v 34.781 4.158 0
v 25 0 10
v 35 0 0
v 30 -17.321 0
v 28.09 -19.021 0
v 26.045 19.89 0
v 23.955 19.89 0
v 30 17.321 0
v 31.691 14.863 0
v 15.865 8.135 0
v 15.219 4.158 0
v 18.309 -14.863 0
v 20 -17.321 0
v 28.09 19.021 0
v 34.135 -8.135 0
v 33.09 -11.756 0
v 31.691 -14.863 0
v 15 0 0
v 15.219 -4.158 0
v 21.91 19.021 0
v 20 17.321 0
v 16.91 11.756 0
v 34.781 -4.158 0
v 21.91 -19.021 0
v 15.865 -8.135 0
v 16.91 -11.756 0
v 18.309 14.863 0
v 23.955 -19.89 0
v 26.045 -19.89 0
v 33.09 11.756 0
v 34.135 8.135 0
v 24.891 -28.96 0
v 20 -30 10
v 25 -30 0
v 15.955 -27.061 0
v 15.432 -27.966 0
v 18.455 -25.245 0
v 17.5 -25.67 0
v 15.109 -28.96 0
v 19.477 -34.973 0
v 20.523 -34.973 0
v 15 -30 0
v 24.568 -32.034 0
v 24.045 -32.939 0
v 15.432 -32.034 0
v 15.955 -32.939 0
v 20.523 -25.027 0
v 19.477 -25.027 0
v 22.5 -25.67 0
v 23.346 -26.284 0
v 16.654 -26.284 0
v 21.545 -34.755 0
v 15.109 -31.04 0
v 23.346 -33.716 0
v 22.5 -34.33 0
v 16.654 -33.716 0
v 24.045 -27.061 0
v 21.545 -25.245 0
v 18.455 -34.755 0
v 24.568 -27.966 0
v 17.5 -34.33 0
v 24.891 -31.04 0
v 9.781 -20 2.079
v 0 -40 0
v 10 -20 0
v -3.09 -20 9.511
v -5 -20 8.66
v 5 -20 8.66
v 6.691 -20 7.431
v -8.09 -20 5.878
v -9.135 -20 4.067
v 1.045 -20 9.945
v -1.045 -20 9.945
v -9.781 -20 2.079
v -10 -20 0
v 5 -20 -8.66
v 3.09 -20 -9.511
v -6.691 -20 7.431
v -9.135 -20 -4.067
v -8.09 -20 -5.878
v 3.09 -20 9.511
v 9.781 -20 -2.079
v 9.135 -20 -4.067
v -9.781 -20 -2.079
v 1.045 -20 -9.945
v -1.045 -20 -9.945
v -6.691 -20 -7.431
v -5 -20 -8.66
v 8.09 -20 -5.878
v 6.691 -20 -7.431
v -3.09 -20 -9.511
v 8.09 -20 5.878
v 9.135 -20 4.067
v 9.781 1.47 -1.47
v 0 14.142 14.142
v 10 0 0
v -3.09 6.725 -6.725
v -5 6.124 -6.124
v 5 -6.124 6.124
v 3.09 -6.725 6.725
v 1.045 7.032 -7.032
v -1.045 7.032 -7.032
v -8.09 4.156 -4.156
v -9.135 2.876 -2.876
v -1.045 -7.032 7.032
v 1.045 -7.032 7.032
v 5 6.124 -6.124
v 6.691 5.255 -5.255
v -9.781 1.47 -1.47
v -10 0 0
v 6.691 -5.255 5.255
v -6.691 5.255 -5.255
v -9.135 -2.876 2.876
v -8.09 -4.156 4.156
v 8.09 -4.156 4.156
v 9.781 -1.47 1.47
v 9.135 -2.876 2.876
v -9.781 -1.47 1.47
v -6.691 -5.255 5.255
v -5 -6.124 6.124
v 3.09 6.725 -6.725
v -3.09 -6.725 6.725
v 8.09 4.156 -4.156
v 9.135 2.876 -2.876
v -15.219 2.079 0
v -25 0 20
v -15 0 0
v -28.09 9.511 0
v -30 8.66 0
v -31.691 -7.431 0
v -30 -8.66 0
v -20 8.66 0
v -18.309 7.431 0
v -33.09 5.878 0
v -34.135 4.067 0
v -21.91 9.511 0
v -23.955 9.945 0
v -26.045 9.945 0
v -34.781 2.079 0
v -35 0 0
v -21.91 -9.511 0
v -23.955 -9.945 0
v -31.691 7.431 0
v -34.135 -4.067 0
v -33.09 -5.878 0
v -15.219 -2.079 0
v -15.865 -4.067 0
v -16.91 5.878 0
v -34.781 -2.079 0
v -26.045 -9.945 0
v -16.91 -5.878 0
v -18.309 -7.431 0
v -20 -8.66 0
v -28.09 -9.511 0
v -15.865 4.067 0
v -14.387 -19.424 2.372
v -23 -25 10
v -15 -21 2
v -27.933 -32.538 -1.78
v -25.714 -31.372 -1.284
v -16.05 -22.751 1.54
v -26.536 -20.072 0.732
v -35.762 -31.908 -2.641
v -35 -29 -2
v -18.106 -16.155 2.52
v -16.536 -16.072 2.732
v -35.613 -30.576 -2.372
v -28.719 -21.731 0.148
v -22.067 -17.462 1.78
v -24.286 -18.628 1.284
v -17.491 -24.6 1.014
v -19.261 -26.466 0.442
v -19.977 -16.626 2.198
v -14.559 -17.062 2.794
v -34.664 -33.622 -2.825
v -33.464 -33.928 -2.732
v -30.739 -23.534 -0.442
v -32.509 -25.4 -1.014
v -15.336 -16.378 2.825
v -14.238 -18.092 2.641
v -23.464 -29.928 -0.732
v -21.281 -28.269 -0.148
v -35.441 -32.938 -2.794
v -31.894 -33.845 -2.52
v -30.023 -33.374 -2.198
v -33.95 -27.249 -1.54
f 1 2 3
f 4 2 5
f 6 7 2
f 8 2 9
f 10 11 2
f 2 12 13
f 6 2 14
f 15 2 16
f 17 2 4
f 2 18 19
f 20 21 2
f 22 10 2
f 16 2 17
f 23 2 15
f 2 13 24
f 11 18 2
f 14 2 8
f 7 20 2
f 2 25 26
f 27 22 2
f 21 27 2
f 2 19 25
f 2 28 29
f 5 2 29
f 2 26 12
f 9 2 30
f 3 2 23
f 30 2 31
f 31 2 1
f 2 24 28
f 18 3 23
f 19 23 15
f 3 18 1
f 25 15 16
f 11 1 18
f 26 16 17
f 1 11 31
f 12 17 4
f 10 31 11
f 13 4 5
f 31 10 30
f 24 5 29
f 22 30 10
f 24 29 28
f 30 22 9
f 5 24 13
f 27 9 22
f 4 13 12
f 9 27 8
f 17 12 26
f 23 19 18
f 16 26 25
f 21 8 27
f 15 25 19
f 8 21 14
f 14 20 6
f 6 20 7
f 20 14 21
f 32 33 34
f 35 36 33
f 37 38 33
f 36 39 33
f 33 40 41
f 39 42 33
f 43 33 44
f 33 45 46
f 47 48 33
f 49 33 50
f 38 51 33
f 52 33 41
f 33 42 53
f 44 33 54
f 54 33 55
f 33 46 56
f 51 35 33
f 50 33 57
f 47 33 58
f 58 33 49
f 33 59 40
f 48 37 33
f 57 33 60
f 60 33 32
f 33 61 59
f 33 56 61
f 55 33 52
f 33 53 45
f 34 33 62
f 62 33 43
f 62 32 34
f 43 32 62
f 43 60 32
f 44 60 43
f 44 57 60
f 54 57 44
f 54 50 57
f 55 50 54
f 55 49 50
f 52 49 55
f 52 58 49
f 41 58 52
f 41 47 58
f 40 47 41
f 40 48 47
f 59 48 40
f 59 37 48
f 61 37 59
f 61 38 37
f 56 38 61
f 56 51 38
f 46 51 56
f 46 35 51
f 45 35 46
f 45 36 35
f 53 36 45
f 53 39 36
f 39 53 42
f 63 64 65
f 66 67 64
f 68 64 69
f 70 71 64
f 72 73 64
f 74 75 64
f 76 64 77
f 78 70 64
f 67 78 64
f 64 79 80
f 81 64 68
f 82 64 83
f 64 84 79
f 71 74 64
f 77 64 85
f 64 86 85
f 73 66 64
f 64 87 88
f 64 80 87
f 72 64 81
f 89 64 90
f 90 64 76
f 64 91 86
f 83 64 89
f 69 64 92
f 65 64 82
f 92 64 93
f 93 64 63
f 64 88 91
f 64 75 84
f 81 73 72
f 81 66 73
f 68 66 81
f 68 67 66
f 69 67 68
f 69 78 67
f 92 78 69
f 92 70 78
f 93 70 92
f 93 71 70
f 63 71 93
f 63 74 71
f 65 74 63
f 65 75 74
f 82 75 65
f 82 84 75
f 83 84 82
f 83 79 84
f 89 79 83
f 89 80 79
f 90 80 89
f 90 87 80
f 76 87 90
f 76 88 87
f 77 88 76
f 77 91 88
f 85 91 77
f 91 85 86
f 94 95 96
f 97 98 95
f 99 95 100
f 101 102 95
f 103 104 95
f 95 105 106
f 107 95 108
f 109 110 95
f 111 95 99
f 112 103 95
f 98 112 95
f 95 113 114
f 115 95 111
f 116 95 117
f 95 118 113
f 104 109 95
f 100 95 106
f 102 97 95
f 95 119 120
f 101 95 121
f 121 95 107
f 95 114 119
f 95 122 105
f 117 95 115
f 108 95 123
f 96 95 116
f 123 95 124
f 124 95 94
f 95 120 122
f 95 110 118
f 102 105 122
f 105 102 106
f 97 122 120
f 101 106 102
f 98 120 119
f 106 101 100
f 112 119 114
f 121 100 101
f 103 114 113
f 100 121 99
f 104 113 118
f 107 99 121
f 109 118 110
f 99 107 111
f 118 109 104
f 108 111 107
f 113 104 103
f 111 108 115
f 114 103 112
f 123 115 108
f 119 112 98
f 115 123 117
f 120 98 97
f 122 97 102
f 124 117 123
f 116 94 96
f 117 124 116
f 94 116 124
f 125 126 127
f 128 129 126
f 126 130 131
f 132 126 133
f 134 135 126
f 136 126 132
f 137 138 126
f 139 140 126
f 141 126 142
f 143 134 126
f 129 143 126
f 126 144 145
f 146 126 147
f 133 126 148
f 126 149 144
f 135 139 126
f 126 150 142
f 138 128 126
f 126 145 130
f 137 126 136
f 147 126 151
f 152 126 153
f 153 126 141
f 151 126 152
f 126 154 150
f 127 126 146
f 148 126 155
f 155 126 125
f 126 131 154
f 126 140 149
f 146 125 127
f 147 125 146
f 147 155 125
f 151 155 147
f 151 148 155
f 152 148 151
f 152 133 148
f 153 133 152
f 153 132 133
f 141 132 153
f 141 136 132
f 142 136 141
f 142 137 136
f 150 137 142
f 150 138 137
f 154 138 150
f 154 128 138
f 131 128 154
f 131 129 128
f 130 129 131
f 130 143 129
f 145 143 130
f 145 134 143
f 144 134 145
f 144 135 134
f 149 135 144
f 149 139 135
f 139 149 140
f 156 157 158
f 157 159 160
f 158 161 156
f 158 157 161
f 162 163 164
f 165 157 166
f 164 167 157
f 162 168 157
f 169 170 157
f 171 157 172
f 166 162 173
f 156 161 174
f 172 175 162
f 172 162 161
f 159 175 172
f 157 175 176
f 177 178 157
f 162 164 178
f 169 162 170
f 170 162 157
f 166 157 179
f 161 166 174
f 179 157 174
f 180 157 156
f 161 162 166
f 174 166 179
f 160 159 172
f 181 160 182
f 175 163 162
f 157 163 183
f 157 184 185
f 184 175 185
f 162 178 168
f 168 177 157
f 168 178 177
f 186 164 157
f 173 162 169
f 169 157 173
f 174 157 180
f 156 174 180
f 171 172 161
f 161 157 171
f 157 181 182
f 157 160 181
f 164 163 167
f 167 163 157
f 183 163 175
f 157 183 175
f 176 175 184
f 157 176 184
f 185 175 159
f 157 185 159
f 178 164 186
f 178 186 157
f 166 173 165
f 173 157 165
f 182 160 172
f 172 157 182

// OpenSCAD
module mycyl() {
  cylinder(r1=10, r2=0, h=20);
}

translate([25,0,0]) scale([1,2,0.5]) mycyl();
translate([20,-30,0]) scale(0.5) mycyl();
translate([0,-20,0]) rotate([90,0,0]) mycyl();
rotate(v=[-1,0,0], a=45) mycyl();
multmatrix([[1,0,0,-25],
            [0,1,0,0],
            [0,0,1,0],
            [0,0,0,1]]) mycyl();
multmatrix([[1,0.4,0.1,-25],
            [0.4,0.8,0,-25],
            [0.2,0.2,0.5,0],
            [0,0,0,1]]) mycyl();

//FIXME: mirror() and scale()
